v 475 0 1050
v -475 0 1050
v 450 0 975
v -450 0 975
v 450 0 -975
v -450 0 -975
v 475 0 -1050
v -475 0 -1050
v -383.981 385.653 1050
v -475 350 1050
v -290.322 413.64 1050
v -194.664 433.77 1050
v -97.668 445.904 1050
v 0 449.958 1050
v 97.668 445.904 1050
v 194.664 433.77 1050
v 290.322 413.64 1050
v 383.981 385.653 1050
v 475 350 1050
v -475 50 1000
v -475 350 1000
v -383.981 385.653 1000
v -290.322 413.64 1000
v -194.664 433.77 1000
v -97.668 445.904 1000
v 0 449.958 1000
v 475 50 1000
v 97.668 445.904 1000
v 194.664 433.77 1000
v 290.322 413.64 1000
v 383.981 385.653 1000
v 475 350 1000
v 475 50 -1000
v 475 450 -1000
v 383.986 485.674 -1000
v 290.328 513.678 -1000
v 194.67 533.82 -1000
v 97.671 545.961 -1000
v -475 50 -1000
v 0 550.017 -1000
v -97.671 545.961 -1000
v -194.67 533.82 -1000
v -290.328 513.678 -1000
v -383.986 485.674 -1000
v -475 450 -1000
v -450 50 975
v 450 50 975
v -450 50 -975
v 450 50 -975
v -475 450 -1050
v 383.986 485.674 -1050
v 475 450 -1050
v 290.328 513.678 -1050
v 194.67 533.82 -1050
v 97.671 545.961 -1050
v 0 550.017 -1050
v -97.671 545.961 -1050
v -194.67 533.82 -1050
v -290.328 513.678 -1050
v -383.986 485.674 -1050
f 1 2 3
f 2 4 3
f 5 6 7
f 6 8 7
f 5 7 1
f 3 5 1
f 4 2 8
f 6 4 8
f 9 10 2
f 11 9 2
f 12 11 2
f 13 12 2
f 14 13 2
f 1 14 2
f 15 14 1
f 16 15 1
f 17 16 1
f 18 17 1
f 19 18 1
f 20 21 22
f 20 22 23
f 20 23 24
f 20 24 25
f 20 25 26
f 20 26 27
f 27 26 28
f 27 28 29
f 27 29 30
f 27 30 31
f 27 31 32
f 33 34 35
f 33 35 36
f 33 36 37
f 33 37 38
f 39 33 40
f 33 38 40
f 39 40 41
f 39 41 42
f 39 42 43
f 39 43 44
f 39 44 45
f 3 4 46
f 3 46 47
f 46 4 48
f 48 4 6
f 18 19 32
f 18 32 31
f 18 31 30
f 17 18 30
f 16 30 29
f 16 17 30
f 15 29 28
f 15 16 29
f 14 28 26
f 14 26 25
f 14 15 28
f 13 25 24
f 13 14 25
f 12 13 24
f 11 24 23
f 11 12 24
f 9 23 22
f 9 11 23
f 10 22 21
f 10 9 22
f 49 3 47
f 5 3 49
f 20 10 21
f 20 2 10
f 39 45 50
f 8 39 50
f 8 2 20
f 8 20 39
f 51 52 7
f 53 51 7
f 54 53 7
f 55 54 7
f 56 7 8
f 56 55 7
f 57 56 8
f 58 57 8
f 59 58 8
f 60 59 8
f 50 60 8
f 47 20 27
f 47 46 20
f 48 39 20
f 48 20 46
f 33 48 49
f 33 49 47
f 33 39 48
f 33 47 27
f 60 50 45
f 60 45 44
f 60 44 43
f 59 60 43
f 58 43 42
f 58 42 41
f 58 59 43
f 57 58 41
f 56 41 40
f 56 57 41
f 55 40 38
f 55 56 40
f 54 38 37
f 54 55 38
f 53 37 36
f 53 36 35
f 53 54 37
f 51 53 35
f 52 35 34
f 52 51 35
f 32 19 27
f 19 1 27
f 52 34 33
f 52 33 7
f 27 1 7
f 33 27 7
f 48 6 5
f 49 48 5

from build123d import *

# Parameters (mm, degrees)
CROQUIS1_W               = 950
CROQUIS1_H               = 2000
CROQUIS1_W_2             = 900
CROQUIS1_H_2             = 1950
SALIENTE_EXTRUIR1_DEPTH  = 50
CROQUIS3_W               = 950
CROQUIS3_H               = 50
SALIENTE_EXTRUIR3_DEPTH  = 50
CROQUIS6_W               = 950
CROQUIS6_H               = 50
SALIENTE_EXTRUIR6_DEPTH  = 50
CROQUIS4_W               = 950
CROQUIS4_H               = 50
SALIENTE_EXTRUIR7_DEPTH  = 400
SALIENTE_EXTRUIR8_DEPTH  = 50
CROQUIS9_W               = 950
CROQUIS9_H               = 50
SALIENTE_EXTRUIR9_DEPTH  = 300
SALIENTE_EXTRUIR10_DEPTH = 50


with BuildPart() as part:
    # Croquis1 → Saliente-Extruir1 (new body)
    with BuildSketch(Plane(origin=(0, 0, 0), x_dir=(1, 0, 0), z_dir=(0, 1, 0))):
        Rectangle(CROQUIS1_W, CROQUIS1_H)
        Rectangle(CROQUIS1_W_2, CROQUIS1_H_2, mode=Mode.SUBTRACT)
    extrude(amount=SALIENTE_EXTRUIR1_DEPTH)

    # Croquis3 → Saliente-Extruir3 (add)
    with BuildSketch(Plane(origin=(0, 0, -1000), x_dir=(-1, 0, 0), z_dir=(0, 0, -1))):
        with Locations((0, 25)):
            Rectangle(CROQUIS3_W, CROQUIS3_H)
    extrude(amount=SALIENTE_EXTRUIR3_DEPTH)

    # Croquis6 → Saliente-Extruir6 (add)
    with BuildSketch(Plane.XY.offset(1000)):
        with Locations((0, 25)):
            Rectangle(CROQUIS6_W, CROQUIS6_H)
    extrude(amount=SALIENTE_EXTRUIR6_DEPTH)

    # Croquis4 → Saliente-Extruir7 (add)
    with BuildSketch(Plane(origin=(0, 50, 0), x_dir=(1, 0, 0), z_dir=(0, 1, 0))):
        with Locations((0, 1025)):
            Rectangle(CROQUIS4_W, CROQUIS4_H)
    extrude(amount=SALIENTE_EXTRUIR7_DEPTH)

    # Croquis8 → Saliente-Extruir8 (add)
    with BuildSketch(Plane(origin=(0, 0, -1050), x_dir=(-1, 0, 0), z_dir=(0, 0, -1))):
        with BuildLine():
            Line((-475, 450), (475, 450))
            ThreePointArc((475, 450), (0, 550.017484419), (-475, 450))
        make_face()
    extrude(amount=-SALIENTE_EXTRUIR8_DEPTH)

    # Croquis9 → Saliente-Extruir9 (add)
    with BuildSketch(Plane(origin=(0, 50, 0), x_dir=(1, 0, 0), z_dir=(0, 1, 0))):
        with Locations((0, -1025)):
            Rectangle(CROQUIS9_W, CROQUIS9_H)
    extrude(amount=SALIENTE_EXTRUIR9_DEPTH)

    # Croquis10 → Saliente-Extruir10 (add)
    with BuildSketch(Plane.XY.offset(1050)):
        with BuildLine():
            Line((-475, 350), (475, 350))
            ThreePointArc((475, 350), (0, 449.957514301), (-475, 350))
        make_face()
    extrude(amount=-SALIENTE_EXTRUIR10_DEPTH)


solid = part.part
